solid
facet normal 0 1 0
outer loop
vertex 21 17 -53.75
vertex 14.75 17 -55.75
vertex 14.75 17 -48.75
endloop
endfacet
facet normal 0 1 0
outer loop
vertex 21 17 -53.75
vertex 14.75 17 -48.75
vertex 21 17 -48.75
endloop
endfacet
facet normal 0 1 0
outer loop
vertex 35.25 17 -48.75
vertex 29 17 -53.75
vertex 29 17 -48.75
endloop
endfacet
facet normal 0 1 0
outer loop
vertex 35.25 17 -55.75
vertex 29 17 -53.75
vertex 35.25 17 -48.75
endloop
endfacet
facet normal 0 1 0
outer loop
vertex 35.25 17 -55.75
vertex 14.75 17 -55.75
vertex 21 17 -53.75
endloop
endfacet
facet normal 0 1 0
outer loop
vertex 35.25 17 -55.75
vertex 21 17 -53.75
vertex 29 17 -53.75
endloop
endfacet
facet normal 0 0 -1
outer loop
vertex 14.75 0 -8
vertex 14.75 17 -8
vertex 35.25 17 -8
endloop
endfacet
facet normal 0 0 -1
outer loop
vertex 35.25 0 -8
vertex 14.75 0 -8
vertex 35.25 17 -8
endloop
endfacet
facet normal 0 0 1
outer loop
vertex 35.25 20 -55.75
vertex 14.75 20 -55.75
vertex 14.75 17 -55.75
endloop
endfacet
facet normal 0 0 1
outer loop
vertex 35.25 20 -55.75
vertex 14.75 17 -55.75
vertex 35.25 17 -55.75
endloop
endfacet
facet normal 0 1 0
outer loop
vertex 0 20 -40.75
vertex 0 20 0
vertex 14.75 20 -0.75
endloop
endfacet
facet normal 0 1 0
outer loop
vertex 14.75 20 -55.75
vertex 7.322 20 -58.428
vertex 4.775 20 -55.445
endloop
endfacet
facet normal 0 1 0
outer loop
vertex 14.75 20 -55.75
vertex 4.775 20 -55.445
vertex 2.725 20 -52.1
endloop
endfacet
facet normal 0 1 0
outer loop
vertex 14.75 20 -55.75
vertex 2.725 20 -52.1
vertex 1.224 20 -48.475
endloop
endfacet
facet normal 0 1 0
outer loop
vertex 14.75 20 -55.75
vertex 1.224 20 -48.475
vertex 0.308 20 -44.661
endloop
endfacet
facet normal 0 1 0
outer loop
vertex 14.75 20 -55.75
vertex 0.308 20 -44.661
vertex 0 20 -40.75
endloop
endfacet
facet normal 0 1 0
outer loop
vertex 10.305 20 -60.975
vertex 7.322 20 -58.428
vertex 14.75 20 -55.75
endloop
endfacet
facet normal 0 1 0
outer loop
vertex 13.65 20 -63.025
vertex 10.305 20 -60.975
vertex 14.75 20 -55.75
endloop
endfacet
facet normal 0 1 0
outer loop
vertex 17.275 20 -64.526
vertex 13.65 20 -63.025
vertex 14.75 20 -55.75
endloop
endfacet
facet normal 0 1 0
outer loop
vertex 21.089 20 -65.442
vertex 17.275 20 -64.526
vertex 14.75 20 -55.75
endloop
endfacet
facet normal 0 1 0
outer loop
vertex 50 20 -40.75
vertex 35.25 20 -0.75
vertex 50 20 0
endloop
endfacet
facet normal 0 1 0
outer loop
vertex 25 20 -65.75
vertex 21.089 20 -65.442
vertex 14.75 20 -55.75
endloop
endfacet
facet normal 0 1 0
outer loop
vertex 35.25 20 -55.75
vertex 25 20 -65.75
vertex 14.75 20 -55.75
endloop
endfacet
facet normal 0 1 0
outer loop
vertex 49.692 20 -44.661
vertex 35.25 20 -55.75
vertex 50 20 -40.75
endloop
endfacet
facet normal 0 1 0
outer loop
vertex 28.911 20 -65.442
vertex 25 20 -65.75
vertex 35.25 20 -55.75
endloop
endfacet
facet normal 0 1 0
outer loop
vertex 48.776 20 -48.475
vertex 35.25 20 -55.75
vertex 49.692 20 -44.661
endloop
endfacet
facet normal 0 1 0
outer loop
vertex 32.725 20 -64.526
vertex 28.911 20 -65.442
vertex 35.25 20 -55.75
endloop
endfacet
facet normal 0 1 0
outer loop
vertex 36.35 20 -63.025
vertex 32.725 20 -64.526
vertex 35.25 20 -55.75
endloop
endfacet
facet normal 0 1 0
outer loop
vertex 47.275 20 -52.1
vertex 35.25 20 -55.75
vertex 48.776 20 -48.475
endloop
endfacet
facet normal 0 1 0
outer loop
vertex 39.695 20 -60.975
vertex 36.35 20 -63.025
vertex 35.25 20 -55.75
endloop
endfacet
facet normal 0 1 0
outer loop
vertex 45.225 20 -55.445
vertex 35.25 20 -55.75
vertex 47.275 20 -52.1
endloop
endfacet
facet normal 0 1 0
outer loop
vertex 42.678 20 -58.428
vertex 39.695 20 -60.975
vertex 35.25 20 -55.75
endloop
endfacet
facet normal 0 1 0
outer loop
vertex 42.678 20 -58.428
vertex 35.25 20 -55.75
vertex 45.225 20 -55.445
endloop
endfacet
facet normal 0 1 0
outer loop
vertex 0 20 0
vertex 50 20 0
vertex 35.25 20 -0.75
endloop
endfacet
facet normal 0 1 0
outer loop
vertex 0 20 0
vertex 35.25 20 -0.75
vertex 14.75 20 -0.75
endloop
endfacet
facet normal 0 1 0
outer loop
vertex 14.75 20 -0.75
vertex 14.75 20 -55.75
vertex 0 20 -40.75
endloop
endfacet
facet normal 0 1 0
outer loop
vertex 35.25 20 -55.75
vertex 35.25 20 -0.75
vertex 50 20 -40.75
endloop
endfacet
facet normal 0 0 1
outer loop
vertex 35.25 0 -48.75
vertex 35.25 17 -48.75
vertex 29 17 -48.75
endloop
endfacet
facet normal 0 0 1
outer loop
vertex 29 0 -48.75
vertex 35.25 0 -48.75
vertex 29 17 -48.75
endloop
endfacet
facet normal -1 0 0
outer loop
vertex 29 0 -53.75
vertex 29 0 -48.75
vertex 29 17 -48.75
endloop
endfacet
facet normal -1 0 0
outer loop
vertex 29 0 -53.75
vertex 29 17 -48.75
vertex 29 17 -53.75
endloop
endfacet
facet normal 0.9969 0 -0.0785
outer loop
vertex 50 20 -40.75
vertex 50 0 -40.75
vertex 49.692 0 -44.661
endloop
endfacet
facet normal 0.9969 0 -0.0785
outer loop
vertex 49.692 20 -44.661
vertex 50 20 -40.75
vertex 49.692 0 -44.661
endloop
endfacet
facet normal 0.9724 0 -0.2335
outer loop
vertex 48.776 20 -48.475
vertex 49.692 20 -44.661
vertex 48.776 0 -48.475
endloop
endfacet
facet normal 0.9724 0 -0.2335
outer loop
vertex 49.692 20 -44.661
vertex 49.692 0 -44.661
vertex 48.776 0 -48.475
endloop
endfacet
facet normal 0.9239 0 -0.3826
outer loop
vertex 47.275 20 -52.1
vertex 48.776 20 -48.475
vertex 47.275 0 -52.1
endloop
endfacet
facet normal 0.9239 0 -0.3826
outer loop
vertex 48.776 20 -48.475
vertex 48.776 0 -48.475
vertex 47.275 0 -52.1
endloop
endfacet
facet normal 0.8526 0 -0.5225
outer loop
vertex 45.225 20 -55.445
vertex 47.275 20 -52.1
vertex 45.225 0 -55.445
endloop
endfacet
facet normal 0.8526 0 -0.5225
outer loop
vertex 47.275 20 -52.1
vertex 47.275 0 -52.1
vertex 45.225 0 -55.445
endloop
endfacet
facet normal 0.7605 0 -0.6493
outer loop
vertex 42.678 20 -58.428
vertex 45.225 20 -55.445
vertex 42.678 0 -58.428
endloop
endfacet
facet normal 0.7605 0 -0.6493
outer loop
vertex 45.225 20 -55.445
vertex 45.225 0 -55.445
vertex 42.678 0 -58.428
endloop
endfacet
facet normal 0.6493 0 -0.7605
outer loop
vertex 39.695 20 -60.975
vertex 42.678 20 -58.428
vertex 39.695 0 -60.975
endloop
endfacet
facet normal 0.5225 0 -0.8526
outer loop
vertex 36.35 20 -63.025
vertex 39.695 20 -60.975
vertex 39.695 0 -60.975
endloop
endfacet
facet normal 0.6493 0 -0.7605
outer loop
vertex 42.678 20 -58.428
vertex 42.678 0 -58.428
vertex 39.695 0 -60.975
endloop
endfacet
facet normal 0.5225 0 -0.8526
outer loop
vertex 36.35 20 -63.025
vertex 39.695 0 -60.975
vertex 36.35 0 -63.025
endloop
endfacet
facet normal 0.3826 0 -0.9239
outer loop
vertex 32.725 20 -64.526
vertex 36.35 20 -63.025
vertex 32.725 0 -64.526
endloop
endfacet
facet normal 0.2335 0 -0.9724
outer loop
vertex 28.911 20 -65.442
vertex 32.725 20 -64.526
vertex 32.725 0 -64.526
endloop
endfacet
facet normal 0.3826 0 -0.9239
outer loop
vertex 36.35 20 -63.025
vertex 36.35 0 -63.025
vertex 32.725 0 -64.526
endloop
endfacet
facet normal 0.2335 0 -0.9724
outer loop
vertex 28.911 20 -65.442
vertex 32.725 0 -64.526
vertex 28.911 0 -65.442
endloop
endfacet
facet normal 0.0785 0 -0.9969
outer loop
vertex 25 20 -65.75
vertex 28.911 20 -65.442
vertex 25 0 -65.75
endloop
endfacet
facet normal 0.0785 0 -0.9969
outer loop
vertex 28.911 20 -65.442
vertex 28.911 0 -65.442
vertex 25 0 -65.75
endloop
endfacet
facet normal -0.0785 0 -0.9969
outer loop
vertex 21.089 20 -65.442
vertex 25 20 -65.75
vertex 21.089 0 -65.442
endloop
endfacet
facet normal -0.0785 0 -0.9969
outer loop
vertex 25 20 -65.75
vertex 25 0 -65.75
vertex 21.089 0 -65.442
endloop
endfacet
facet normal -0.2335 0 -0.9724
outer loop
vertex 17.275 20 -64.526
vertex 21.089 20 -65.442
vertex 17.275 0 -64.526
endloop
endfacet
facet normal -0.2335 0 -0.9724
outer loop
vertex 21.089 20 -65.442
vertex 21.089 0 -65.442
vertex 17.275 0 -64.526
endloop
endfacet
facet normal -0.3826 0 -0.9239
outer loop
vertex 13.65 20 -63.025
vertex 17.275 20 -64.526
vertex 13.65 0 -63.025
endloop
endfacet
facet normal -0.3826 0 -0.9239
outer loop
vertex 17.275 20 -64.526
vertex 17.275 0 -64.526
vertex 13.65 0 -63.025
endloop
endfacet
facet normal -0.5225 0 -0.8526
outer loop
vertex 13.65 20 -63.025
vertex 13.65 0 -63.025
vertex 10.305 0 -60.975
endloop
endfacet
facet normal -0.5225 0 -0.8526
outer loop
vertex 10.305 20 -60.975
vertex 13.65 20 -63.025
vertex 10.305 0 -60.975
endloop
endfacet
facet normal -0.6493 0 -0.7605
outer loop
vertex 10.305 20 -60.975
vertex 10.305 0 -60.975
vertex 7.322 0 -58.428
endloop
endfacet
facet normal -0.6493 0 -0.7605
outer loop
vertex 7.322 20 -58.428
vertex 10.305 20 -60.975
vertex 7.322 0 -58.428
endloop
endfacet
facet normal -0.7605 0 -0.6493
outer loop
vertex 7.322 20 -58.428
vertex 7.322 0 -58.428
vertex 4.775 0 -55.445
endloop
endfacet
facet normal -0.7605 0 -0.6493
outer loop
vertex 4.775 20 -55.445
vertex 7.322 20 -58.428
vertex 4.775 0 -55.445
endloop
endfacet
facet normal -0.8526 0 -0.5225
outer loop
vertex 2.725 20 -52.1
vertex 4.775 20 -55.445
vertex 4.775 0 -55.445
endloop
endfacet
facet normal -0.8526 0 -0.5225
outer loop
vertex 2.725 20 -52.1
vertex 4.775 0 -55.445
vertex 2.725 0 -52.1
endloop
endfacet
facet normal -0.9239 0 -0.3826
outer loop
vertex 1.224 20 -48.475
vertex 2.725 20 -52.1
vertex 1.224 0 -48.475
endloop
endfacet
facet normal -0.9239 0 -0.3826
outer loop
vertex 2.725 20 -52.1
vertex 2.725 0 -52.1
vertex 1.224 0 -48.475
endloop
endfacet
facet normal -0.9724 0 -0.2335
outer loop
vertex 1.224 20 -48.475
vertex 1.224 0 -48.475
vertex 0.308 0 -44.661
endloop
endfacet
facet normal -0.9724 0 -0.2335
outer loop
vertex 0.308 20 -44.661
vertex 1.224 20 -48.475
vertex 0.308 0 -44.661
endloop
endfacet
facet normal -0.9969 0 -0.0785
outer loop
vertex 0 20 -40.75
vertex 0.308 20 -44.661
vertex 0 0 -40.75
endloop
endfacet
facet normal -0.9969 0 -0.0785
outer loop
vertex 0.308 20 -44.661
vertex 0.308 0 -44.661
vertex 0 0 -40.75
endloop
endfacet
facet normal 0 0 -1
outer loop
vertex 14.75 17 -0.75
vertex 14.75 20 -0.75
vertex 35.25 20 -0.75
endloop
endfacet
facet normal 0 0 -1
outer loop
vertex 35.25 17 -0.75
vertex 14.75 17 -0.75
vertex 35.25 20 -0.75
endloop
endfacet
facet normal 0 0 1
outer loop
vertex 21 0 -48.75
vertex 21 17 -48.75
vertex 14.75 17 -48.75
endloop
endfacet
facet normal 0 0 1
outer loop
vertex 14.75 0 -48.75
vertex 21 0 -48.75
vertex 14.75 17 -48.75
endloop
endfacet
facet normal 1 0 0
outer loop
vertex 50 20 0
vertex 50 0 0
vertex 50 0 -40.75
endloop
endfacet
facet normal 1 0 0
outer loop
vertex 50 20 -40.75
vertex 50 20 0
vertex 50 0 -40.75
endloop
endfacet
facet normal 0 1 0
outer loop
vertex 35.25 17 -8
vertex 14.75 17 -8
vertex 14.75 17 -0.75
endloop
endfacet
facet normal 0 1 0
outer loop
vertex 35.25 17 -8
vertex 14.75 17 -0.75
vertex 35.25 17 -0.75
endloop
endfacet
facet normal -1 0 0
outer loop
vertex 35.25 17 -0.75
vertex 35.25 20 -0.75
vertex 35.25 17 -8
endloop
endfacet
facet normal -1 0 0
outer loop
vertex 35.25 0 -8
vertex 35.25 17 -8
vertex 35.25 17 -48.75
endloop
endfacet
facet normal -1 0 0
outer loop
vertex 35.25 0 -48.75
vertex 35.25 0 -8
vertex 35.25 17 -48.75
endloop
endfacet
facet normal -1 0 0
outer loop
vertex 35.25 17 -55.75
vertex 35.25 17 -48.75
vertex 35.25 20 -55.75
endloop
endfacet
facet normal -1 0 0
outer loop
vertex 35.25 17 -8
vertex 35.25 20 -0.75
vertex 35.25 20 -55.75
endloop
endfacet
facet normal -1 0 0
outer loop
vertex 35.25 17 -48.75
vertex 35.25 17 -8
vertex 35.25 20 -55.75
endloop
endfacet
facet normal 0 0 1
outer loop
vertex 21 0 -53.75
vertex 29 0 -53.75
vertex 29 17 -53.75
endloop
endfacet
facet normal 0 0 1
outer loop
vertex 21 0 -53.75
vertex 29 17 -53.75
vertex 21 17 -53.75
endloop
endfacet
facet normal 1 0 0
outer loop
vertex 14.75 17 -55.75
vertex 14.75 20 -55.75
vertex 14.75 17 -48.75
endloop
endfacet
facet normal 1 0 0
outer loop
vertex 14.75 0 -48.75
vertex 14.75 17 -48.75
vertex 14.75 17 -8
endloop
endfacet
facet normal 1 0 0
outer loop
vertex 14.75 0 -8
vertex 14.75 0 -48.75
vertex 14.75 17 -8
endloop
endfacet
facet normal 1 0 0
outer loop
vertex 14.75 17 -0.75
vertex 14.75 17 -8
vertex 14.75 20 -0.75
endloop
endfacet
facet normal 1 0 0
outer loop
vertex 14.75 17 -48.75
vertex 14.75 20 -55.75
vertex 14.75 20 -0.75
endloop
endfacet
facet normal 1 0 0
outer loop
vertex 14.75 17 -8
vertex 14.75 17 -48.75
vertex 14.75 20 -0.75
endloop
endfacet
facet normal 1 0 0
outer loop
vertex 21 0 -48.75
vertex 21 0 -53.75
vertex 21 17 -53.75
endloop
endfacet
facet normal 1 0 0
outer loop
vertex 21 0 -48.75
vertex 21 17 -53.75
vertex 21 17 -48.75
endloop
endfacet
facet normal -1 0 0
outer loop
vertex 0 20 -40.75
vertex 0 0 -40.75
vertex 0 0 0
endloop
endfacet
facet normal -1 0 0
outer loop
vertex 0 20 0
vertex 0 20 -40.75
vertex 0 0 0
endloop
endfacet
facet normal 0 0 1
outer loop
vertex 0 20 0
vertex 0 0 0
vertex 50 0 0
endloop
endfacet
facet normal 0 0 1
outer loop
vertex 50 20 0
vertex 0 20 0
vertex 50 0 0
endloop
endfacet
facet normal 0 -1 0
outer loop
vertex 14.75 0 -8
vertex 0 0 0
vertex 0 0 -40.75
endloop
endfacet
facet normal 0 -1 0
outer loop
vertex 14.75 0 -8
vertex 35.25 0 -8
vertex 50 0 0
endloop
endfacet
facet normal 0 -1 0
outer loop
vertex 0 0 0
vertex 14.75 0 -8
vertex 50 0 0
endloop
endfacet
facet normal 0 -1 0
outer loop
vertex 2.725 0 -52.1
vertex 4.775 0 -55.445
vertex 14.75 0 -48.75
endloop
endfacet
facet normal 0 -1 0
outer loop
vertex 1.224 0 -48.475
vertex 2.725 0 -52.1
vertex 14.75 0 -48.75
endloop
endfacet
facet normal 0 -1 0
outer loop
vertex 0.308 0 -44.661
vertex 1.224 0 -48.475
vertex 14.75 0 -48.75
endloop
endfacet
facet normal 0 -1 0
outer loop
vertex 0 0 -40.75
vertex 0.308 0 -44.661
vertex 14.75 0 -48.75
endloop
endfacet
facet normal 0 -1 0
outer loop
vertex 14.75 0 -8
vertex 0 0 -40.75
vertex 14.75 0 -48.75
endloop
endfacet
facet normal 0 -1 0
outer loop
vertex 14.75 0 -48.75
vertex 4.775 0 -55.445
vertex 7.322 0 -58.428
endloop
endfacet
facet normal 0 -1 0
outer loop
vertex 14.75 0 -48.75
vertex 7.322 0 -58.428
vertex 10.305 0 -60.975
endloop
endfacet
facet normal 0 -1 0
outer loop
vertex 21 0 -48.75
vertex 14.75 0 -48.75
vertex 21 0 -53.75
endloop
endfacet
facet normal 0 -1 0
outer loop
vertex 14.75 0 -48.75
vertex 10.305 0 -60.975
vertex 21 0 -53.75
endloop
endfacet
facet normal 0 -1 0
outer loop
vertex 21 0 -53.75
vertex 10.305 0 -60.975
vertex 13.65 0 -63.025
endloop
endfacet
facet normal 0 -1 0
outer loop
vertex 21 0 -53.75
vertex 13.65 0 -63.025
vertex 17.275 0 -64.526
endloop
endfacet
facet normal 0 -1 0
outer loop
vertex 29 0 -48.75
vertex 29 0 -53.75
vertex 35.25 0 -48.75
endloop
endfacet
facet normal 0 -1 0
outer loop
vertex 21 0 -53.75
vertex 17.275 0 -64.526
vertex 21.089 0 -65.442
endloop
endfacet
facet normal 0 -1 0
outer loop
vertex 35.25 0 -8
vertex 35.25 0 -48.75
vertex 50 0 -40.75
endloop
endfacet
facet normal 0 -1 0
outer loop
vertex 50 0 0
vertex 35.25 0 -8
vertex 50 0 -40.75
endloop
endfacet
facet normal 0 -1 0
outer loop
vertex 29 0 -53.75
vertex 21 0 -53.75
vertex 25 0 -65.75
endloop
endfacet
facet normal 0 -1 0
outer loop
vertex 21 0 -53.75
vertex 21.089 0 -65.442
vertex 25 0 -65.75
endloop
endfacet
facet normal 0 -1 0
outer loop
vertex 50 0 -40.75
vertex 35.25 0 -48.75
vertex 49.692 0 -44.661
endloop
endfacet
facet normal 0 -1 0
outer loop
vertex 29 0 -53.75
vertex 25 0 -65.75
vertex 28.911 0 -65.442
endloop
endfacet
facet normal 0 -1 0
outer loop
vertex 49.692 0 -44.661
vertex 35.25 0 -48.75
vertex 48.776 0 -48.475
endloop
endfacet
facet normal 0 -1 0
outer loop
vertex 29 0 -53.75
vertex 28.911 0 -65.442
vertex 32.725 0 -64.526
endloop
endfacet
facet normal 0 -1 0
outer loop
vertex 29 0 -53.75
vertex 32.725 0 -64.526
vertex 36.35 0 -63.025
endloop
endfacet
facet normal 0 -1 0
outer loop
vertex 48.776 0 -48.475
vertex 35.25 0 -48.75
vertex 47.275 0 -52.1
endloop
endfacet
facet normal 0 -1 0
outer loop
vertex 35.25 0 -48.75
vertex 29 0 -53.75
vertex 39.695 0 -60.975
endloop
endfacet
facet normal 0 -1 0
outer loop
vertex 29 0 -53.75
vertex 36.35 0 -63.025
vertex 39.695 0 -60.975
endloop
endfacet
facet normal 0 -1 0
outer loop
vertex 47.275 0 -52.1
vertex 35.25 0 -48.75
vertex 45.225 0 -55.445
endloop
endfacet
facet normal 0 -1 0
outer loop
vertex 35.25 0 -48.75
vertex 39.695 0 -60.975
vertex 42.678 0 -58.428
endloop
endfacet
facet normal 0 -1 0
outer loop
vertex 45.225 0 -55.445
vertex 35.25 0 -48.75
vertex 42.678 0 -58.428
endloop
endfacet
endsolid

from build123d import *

# Parameters (mm, degrees)
BOSS_EXTRUDE1_DEPTH = 20
CUT_EXTRUDE1_DEPTH  = 20
SKETCH3_W           = 20.5
SKETCH3_H           = 7
SKETCH3_H_2         = 7.25
CUT_EXTRUDE2_DEPTH  = 3


with BuildPart() as part:
    # Sketch1 → Boss-Extrude1 (new body)
    with BuildSketch(Plane(origin=(0, 0, 0), x_dir=(1, 0, 0), z_dir=(0, 1, 0))):
        with BuildLine():
            Line((0, 0), (50, 0))
            Line((50, 0), (50, 40.75))
            ThreePointArc((50, 40.75), (25, 65.75), (0, 40.75))
            Line((0, 40.75), (0, 0))
        make_face()
    extrude(amount=BOSS_EXTRUDE1_DEPTH)

    # Sketch2 → Cut-Extrude1 (cut)
    with BuildSketch(Plane(origin=(0, 20, 0), x_dir=(1, 0, 0), z_dir=(0, 1, 0))):
        Polygon((14.75, 8), (35.25, 8), (35.25, 48.75), (29, 48.75), (29, 53.75), (21, 53.75), (21, 48.75), (14.75, 48.75), align=None)
    extrude(amount=-CUT_EXTRUDE1_DEPTH, mode=Mode.SUBTRACT)

    # Sketch3 → Cut-Extrude2 (cut)
    with BuildSketch(Plane(origin=(0, 20, 0), x_dir=(1, 0, 0), z_dir=(0, 1, 0))):
        with Locations((25, 52.25)):
            Rectangle(SKETCH3_W, SKETCH3_H)
        with Locations((25, 4.375)):
            Rectangle(SKETCH3_W, SKETCH3_H_2)
    extrude(amount=-CUT_EXTRUDE2_DEPTH, mode=Mode.SUBTRACT)


solid = part.part
